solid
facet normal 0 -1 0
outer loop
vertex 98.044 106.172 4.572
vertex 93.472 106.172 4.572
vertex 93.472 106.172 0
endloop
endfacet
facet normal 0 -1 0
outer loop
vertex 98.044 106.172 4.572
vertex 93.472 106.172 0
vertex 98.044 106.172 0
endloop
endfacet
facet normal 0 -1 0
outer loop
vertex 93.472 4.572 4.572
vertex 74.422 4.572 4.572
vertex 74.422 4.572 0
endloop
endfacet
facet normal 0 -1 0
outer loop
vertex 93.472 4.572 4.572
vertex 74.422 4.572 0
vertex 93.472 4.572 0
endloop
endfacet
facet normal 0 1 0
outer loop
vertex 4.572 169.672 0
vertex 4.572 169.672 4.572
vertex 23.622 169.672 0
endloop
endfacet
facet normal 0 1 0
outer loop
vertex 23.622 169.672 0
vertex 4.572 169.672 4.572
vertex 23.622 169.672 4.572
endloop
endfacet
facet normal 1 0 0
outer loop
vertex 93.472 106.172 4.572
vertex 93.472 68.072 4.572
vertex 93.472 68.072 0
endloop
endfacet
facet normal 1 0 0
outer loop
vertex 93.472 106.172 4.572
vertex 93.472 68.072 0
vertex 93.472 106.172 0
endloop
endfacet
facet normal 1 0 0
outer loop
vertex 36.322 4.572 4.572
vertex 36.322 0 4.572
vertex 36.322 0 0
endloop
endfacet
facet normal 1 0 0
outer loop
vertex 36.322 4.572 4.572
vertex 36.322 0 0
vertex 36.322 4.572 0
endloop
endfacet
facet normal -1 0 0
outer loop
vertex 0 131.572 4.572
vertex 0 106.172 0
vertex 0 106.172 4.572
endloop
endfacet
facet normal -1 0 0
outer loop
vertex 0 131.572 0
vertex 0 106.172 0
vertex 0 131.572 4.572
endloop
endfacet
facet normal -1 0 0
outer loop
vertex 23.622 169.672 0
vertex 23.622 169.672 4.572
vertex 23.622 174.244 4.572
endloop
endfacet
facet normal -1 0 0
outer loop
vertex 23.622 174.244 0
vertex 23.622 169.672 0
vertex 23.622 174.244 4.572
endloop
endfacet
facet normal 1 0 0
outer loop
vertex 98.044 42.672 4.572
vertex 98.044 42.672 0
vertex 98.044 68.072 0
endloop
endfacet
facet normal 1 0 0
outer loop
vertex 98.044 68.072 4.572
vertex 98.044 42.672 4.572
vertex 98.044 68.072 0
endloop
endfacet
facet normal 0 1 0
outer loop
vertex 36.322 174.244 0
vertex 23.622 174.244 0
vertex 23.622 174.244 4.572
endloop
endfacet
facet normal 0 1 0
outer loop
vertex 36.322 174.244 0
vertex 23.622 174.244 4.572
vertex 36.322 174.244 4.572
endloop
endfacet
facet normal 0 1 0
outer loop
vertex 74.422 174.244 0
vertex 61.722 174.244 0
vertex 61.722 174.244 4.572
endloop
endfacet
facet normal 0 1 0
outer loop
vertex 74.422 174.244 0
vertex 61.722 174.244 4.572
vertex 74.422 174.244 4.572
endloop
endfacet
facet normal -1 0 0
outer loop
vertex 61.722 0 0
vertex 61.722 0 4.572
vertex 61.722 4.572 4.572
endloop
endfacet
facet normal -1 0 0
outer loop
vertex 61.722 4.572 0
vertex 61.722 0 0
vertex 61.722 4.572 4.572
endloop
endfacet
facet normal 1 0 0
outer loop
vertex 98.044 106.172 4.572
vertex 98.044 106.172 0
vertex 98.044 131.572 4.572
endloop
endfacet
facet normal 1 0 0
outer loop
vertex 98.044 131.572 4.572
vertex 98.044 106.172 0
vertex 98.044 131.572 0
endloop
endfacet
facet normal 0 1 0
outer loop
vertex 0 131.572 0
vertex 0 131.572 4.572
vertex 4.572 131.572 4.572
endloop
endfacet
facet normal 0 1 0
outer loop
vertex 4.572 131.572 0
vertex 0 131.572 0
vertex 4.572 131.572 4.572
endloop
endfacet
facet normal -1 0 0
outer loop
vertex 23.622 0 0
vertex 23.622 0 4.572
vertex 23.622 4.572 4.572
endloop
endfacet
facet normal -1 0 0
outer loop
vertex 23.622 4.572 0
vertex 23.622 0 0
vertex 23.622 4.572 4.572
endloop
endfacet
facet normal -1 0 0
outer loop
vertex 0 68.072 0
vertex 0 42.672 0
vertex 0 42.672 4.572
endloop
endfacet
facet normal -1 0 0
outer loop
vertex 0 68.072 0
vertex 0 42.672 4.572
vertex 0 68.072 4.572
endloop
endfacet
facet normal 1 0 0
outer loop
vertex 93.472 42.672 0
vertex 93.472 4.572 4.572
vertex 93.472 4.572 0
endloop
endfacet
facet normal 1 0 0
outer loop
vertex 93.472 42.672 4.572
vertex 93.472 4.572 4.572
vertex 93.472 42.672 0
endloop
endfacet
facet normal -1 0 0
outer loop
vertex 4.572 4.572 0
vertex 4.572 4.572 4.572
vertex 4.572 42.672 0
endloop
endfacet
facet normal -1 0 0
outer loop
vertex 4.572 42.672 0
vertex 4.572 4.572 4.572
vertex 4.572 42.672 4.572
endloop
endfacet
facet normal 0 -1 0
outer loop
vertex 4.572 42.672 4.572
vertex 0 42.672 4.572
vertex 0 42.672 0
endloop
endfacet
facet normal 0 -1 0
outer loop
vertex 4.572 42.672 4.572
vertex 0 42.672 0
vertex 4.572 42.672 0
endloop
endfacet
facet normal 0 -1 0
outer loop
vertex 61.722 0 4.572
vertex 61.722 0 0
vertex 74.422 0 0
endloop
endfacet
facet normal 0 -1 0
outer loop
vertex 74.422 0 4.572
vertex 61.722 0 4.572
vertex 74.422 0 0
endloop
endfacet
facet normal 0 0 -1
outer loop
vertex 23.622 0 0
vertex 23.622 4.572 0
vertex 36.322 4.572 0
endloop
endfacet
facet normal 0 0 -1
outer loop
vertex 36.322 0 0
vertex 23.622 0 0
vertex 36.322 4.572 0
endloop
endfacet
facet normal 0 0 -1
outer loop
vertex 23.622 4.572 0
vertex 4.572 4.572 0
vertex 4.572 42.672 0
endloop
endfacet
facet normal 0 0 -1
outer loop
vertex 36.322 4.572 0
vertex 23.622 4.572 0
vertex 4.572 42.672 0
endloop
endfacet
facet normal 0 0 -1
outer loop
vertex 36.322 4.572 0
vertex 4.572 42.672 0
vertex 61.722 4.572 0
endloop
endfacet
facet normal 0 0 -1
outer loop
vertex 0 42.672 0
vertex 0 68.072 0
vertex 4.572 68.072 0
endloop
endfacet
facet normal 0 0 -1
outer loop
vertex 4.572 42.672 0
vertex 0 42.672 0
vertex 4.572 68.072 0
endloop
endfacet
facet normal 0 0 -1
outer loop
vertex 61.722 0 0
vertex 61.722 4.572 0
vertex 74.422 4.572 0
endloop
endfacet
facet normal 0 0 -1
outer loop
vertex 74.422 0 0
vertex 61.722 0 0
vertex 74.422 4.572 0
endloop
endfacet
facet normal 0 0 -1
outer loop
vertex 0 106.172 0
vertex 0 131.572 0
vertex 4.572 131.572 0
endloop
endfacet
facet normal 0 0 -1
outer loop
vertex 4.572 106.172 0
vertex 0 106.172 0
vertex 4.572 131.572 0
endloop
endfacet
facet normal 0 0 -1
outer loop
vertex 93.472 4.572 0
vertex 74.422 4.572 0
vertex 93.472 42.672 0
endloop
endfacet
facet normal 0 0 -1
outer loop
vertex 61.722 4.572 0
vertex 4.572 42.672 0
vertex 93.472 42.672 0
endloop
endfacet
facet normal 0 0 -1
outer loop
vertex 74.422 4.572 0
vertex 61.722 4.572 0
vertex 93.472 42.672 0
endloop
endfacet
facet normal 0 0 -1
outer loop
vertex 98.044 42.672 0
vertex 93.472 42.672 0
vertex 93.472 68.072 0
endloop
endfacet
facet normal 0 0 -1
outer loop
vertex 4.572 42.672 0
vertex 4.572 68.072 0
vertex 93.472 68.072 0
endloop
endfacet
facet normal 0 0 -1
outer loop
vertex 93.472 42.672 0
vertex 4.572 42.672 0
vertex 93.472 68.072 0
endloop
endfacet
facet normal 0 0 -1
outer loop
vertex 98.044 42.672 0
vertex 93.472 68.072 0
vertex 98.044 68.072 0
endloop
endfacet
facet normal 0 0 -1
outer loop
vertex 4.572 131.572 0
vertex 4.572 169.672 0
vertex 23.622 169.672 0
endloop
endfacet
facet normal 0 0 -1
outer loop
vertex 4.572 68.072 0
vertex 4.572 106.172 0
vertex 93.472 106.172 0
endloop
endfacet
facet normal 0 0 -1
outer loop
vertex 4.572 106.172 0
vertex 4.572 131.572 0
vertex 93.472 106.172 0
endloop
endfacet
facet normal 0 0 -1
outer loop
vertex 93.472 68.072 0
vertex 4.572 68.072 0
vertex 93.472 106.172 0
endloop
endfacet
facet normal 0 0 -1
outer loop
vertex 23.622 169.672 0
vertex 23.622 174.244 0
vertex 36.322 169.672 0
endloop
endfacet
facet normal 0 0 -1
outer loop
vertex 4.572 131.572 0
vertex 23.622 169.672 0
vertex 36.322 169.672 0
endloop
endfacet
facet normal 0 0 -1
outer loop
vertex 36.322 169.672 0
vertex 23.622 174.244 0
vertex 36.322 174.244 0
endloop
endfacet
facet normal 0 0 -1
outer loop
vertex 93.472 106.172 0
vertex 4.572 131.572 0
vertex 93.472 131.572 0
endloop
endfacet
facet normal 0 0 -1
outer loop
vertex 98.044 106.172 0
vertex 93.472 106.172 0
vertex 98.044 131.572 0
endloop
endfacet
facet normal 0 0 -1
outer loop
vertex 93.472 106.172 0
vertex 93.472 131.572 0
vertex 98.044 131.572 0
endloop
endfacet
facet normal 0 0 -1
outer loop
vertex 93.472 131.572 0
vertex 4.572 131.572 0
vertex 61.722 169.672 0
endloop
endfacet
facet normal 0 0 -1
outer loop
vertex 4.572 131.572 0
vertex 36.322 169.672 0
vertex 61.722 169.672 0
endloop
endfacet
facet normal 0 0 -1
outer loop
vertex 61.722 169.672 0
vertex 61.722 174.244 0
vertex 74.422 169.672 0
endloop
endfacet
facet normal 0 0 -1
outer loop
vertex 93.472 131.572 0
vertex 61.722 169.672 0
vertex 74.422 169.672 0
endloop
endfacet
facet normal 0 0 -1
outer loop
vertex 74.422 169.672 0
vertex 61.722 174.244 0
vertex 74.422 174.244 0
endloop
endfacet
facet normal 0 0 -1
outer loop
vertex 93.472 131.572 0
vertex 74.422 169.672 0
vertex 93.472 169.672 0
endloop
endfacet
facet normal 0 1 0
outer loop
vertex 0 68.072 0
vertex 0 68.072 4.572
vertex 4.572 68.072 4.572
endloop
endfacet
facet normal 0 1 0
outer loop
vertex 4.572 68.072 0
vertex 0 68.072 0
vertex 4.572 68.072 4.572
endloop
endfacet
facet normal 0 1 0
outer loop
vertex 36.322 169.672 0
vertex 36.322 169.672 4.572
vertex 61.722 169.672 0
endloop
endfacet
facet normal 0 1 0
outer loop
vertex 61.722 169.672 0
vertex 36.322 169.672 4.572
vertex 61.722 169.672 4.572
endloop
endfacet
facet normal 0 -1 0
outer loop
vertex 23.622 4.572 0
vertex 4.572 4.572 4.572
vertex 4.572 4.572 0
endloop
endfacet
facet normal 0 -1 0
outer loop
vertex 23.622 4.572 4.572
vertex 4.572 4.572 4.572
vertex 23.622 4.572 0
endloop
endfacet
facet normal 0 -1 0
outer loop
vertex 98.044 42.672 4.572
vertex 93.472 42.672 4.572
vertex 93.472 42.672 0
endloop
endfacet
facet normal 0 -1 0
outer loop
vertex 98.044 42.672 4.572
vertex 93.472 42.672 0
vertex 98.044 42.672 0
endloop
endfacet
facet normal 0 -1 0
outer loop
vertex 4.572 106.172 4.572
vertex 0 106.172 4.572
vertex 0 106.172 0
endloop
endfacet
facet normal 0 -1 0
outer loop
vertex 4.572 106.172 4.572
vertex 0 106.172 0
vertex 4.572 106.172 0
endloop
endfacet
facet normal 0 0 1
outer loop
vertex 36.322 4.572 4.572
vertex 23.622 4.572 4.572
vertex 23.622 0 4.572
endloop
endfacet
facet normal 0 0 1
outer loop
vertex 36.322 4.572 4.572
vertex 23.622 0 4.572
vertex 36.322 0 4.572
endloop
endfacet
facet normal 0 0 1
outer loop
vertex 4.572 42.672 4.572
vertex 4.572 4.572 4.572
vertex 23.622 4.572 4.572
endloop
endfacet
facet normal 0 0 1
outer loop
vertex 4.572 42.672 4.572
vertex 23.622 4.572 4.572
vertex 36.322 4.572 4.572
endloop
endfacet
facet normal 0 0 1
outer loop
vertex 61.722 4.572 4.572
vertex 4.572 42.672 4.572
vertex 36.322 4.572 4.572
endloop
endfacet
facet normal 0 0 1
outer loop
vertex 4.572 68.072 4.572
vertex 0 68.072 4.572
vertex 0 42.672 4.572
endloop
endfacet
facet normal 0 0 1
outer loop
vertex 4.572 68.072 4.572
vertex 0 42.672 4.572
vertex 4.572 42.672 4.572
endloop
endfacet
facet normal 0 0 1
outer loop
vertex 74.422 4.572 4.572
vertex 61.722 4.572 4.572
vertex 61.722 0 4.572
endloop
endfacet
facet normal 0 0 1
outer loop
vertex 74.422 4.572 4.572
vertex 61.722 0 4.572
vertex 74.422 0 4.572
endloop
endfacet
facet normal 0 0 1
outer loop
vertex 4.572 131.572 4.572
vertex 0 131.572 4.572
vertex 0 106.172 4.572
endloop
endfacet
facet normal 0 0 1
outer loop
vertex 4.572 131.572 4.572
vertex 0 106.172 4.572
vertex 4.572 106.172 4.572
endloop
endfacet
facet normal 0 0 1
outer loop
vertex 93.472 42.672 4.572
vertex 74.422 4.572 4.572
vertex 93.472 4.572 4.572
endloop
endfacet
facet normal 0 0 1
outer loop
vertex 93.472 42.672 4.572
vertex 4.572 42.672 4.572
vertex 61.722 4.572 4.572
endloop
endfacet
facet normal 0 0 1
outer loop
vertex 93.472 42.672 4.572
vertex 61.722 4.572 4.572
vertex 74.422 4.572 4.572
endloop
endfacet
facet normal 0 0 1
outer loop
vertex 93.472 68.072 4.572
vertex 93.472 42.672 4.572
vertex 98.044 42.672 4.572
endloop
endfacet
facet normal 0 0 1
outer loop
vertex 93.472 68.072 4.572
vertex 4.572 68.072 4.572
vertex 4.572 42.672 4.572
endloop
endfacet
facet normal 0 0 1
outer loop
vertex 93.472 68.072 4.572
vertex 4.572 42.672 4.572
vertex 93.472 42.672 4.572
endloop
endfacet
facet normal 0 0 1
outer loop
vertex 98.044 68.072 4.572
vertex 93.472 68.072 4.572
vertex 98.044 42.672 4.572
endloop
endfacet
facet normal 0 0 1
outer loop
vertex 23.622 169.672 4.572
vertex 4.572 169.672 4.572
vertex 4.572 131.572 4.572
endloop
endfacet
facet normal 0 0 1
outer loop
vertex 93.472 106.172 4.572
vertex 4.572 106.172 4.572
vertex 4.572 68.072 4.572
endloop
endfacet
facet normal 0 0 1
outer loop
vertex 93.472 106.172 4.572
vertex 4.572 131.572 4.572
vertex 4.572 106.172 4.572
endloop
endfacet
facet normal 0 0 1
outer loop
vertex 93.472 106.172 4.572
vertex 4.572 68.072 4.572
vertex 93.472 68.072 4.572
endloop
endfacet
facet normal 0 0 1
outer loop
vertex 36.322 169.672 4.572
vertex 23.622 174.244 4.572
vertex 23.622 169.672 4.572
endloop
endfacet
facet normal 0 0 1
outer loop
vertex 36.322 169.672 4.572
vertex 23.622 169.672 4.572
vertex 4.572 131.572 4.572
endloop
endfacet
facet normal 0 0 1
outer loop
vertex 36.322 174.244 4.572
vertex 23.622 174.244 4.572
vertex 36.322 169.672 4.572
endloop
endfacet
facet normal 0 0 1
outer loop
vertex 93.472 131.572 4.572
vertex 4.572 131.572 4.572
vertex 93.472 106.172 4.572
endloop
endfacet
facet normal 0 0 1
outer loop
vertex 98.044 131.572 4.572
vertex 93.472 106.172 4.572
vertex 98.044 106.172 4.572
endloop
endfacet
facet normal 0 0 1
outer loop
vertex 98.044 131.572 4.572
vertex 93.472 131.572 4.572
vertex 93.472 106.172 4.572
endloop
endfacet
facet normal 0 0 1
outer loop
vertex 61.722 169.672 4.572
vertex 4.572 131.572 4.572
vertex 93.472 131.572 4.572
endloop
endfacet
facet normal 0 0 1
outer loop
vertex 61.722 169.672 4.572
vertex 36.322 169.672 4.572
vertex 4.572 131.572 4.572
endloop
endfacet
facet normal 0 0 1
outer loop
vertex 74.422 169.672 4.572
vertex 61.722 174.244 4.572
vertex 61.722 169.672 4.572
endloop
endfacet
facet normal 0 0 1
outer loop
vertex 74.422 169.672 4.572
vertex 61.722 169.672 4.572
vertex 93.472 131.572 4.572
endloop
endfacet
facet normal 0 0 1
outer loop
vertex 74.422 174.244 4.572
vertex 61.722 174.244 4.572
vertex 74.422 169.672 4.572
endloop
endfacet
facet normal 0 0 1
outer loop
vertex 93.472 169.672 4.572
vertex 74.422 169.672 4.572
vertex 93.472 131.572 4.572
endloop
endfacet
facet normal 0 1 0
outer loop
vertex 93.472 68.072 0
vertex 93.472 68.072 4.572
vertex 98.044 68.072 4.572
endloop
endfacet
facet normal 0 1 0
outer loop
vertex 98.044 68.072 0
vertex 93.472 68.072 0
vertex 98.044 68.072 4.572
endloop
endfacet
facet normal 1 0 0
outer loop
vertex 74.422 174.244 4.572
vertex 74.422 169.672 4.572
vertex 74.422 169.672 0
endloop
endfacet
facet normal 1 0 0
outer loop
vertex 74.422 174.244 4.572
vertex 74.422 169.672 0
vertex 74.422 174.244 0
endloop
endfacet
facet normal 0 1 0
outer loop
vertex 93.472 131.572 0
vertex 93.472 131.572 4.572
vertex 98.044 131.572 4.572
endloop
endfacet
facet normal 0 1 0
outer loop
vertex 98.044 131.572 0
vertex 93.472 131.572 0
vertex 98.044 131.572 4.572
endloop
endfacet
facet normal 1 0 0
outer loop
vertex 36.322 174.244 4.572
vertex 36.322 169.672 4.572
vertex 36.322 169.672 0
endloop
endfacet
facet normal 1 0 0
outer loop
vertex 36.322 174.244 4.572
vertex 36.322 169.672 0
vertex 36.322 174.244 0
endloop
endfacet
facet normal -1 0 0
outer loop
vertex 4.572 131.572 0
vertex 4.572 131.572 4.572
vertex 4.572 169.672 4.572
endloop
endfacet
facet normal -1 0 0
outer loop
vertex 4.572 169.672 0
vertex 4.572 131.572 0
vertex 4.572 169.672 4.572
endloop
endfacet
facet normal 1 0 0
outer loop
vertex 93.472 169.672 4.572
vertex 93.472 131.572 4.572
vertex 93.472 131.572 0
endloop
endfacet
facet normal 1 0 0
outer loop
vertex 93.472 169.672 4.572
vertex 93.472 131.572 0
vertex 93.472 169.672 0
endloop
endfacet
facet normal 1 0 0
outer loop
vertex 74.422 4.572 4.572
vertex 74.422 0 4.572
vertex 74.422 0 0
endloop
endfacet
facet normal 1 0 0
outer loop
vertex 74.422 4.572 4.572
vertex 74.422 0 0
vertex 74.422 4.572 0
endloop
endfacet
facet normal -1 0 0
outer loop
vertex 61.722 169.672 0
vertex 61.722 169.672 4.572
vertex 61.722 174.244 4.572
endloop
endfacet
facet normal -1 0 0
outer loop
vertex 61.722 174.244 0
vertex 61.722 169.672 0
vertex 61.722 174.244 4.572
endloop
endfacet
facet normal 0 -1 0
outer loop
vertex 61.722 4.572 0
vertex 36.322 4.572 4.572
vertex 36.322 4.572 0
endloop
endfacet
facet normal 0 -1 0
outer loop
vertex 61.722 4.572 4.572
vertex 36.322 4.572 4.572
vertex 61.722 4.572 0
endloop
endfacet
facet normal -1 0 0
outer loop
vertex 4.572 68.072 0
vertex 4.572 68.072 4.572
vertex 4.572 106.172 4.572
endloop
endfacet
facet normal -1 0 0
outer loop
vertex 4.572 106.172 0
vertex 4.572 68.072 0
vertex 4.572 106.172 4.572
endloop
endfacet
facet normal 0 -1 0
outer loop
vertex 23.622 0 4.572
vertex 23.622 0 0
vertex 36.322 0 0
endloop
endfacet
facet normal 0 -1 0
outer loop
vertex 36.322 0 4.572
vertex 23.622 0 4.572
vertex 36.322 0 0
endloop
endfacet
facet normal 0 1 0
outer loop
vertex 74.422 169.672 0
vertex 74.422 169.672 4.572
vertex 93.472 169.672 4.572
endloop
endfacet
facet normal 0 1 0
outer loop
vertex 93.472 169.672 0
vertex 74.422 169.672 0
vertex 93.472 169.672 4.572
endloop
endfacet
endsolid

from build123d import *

# Parameters (mm, degrees)
SKETCH1_W           = 98.044
SKETCH1_H           = 174.244
BOSS_EXTRUDE1_DEPTH = 4.572
SKETCH2_W           = 23.622
SKETCH2_H           = 4.572
SKETCH2_W_2         = 25.4
CUT_EXTRUDE1_DEPTH  = 4.572
SKETCH3_W           = 4.572
SKETCH3_H           = 38.1
CUT_EXTRUDE2_DEPTH  = 4.572


with BuildPart() as part:
    # Sketch1 → Boss-Extrude1 (new body)
    with BuildSketch(Plane.XY):
        with Locations((49.022, 87.122)):
            Rectangle(SKETCH1_W, SKETCH1_H)
    extrude(amount=BOSS_EXTRUDE1_DEPTH)

    # Sketch2 → Cut-Extrude1 (cut)
    with BuildSketch(Plane.XY.offset(4.572)):
        with Locations((11.811, 2.286)):
            Rectangle(SKETCH2_W, SKETCH2_H)
        with Locations((49.022, 2.286)):
            Rectangle(SKETCH2_W_2, SKETCH2_H)
        with Locations((86.233, 2.286)):
            Rectangle(SKETCH2_W, SKETCH2_H)
        with Locations((11.811, 171.958)):
            Rectangle(SKETCH2_W, SKETCH2_H)
        with Locations((49.022, 171.958)):
            Rectangle(SKETCH2_W_2, SKETCH2_H)
        with Locations((86.233, 171.958)):
            Rectangle(SKETCH2_W, SKETCH2_H)
    extrude(amount=-CUT_EXTRUDE1_DEPTH, mode=Mode.SUBTRACT)

    # Sketch3 → Cut-Extrude2 (cut)
    with BuildSketch(Plane.XY.offset(4.572)):
        with Locations((2.286, 23.622)):
            Rectangle(SKETCH3_W, SKETCH3_H)
        with Locations((95.758, 23.622)):
            Rectangle(SKETCH3_W, SKETCH3_H)
        with Locations((2.286, 87.122)):
            Rectangle(SKETCH3_W, SKETCH3_H)
        with Locations((2.286, 150.622)):
            Rectangle(SKETCH3_W, SKETCH3_H)
        with Locations((95.758, 150.622)):
            Rectangle(SKETCH3_W, SKETCH3_H)
        with Locations((95.758, 87.122)):
            Rectangle(SKETCH3_W, SKETCH3_H)
    extrude(amount=-CUT_EXTRUDE2_DEPTH, mode=Mode.SUBTRACT)


solid = part.part
